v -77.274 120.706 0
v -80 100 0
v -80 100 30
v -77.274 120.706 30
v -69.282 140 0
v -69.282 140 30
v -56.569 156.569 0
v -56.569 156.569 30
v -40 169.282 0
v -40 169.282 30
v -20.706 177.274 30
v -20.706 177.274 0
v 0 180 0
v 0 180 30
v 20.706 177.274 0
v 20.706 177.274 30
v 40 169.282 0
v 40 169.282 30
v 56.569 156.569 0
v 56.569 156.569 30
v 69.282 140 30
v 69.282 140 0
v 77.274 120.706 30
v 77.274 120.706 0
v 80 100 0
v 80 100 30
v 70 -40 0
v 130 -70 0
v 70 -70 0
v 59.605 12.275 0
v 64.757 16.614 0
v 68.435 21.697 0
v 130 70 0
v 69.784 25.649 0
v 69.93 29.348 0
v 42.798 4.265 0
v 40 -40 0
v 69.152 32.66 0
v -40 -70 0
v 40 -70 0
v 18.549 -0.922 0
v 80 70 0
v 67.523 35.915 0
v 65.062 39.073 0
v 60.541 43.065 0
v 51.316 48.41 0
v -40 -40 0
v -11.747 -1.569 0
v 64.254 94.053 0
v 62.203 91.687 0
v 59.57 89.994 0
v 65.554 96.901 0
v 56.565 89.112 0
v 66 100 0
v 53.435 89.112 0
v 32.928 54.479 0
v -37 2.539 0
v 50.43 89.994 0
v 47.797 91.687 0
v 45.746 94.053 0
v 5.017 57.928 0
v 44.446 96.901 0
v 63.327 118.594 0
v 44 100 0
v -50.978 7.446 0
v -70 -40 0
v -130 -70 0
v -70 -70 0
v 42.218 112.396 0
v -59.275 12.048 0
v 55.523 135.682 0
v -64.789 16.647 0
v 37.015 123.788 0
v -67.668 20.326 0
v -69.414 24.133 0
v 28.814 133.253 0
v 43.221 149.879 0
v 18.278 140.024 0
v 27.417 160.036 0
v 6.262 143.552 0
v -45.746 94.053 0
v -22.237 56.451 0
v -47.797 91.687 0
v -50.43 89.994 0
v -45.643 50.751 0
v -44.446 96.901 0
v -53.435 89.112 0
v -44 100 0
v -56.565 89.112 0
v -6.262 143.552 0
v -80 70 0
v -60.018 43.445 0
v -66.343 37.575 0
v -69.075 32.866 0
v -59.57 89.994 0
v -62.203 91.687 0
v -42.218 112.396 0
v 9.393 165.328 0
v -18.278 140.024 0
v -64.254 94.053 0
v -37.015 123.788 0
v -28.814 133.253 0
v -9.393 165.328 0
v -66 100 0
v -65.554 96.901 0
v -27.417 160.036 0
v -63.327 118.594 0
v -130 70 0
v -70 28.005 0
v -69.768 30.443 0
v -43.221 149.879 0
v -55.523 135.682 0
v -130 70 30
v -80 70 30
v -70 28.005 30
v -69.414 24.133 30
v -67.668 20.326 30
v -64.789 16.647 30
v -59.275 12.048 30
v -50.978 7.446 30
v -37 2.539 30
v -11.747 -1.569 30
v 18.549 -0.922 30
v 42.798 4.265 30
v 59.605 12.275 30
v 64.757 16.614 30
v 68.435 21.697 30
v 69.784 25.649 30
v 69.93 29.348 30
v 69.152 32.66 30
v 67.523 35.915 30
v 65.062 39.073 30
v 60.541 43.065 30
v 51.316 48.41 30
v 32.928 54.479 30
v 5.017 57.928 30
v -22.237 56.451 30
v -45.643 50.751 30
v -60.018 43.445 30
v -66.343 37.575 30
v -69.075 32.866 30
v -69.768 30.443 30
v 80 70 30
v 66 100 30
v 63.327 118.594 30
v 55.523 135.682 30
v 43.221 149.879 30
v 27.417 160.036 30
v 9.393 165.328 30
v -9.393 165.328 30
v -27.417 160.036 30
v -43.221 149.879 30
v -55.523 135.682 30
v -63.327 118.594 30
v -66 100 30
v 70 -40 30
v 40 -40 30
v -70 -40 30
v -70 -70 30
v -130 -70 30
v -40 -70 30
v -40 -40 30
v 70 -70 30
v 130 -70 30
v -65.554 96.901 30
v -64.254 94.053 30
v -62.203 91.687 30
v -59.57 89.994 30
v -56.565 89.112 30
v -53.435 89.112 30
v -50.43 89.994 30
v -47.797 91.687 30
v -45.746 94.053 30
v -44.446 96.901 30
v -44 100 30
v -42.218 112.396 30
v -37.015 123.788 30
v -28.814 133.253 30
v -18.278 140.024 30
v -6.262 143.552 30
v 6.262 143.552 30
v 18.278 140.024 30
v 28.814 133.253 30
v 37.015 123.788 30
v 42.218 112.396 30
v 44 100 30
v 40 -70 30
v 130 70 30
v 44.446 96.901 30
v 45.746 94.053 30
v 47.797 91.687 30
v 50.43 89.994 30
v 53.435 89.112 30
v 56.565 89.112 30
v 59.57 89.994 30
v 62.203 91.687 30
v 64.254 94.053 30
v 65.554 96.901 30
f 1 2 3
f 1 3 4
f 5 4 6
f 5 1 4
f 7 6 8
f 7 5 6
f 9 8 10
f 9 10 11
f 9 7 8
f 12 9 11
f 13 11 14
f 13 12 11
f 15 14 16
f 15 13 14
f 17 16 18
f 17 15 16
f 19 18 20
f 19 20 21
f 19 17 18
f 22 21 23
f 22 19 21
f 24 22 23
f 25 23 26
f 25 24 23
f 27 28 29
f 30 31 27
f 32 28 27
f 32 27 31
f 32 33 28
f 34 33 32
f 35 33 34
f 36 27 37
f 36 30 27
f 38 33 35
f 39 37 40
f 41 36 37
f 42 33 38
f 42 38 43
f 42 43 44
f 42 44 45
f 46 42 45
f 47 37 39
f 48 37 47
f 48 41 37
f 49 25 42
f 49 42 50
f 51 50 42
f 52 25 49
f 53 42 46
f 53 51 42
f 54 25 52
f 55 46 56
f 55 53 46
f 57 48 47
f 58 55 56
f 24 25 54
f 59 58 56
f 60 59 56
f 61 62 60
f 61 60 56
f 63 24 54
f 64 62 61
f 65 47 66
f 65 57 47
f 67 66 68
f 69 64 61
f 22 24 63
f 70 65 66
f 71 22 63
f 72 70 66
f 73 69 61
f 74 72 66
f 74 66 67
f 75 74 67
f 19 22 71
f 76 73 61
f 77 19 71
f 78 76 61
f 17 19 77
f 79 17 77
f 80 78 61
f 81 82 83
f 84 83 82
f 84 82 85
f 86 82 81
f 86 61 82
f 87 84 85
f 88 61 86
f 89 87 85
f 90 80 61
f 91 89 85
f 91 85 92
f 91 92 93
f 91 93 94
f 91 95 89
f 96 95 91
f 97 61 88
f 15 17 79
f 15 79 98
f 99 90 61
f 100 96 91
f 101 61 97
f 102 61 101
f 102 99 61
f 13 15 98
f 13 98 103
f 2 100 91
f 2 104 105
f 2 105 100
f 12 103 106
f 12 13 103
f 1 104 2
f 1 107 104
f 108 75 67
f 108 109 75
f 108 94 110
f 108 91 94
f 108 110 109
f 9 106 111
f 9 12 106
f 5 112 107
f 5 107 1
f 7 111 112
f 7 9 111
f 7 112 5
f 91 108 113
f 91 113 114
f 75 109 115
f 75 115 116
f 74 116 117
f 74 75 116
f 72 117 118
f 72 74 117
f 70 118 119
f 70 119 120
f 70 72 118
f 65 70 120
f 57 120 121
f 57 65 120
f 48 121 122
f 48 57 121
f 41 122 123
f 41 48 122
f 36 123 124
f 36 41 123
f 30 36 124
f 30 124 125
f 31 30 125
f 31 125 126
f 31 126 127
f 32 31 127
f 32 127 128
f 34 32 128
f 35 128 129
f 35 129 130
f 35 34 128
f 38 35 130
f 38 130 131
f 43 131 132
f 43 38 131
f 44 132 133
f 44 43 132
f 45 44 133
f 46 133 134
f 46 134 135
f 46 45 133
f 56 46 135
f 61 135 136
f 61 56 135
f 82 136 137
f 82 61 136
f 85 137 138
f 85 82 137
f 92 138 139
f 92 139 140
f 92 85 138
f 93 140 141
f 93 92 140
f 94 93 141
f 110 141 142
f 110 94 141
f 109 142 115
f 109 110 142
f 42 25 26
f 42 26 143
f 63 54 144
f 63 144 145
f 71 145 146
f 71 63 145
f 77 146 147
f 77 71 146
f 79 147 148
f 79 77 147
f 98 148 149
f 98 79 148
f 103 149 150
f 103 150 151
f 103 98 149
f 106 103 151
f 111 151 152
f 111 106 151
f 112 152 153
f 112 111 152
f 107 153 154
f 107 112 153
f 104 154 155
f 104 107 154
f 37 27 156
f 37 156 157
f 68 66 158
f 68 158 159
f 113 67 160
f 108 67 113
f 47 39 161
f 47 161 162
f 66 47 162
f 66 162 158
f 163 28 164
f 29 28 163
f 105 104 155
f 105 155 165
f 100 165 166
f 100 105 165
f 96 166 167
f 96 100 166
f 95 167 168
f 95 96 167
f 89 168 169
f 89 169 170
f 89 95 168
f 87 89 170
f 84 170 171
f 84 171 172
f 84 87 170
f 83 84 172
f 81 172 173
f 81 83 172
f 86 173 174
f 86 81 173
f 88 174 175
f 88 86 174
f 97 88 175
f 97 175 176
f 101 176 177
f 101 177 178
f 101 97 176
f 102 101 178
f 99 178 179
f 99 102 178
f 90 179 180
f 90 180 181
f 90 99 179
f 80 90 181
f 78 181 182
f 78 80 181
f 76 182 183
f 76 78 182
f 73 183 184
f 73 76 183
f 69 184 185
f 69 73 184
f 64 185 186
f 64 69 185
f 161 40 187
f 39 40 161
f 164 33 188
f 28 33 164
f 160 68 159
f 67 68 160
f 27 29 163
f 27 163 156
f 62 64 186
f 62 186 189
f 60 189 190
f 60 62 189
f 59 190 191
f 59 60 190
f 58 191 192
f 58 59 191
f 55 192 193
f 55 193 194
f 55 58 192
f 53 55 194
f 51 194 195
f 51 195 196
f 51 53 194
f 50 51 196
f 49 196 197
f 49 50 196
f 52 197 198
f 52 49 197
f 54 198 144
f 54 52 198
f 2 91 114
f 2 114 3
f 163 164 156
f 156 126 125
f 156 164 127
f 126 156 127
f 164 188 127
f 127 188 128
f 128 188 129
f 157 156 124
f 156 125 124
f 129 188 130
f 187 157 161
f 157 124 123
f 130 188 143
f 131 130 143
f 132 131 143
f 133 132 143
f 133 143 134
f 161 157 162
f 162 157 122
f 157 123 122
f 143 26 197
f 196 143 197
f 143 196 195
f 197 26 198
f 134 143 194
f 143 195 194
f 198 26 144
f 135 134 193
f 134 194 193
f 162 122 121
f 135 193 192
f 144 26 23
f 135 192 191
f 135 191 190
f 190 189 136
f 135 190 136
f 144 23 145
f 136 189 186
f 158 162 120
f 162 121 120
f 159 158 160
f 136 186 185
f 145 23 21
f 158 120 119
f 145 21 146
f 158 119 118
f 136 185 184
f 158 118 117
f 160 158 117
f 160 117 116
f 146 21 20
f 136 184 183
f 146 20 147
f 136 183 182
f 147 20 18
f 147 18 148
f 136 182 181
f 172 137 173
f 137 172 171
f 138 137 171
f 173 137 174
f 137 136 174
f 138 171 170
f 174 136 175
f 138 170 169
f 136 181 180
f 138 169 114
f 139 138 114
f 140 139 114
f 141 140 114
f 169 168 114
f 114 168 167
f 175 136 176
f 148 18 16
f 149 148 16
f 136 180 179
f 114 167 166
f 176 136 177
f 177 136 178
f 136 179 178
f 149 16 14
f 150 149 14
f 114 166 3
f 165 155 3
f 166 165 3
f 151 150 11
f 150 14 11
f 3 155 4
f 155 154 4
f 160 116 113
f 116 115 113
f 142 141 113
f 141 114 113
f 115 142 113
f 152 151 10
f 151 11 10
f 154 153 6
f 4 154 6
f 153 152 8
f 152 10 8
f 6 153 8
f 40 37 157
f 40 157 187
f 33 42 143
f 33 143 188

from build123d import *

# Parameters (mm, degrees)
SKETCH1_RX          = 70
SKETCH1_RY          = 30
BOSS_EXTRUDE1_DEPTH = 30


with BuildPart() as part:
    # Sketch1 → Boss-Extrude1 (new body)
    with BuildSketch(Plane.XY):
        with BuildLine():
            Line((130, -70), (70, -70))
            Line((70, -70), (70, -40))
            Line((70, -40), (40, -40))
            Line((40, -40), (40, -70))
            Line((40, -70), (-40, -70))
            Line((-40, -70), (-40, -40))
            Line((-40, -40), (-70, -40))
            Line((-70, -40), (-70, -70))
            Line((-70, -70), (-130, -70))
            Line((-130, -70), (-130, 70))
            Line((-130, 70), (-80, 70))
            Line((-80, 70), (-80, 100))
            ThreePointArc((-80, 100), (0, 180), (80, 100))
            Line((80, 100), (80, 70))
            Line((80, 70), (130, 70))
            Line((130, 70), (130, -70))
        make_face()
        with Locations(Location((0, 28.005273926), (0, 0, -180))):
            Ellipse(SKETCH1_RX, SKETCH1_RY, mode=Mode.SUBTRACT)
        with BuildLine():
            ThreePointArc((66, 100), (0, 166), (-66, 100))
            ThreePointArc((-66, 100), (-55, 89), (-44, 100))
            ThreePointArc((-44, 100), (0, 144), (44, 100))
            ThreePointArc((44, 100), (55, 89), (66, 100))
        make_face(mode=Mode.SUBTRACT)
    extrude(amount=BOSS_EXTRUDE1_DEPTH)


solid = part.part
